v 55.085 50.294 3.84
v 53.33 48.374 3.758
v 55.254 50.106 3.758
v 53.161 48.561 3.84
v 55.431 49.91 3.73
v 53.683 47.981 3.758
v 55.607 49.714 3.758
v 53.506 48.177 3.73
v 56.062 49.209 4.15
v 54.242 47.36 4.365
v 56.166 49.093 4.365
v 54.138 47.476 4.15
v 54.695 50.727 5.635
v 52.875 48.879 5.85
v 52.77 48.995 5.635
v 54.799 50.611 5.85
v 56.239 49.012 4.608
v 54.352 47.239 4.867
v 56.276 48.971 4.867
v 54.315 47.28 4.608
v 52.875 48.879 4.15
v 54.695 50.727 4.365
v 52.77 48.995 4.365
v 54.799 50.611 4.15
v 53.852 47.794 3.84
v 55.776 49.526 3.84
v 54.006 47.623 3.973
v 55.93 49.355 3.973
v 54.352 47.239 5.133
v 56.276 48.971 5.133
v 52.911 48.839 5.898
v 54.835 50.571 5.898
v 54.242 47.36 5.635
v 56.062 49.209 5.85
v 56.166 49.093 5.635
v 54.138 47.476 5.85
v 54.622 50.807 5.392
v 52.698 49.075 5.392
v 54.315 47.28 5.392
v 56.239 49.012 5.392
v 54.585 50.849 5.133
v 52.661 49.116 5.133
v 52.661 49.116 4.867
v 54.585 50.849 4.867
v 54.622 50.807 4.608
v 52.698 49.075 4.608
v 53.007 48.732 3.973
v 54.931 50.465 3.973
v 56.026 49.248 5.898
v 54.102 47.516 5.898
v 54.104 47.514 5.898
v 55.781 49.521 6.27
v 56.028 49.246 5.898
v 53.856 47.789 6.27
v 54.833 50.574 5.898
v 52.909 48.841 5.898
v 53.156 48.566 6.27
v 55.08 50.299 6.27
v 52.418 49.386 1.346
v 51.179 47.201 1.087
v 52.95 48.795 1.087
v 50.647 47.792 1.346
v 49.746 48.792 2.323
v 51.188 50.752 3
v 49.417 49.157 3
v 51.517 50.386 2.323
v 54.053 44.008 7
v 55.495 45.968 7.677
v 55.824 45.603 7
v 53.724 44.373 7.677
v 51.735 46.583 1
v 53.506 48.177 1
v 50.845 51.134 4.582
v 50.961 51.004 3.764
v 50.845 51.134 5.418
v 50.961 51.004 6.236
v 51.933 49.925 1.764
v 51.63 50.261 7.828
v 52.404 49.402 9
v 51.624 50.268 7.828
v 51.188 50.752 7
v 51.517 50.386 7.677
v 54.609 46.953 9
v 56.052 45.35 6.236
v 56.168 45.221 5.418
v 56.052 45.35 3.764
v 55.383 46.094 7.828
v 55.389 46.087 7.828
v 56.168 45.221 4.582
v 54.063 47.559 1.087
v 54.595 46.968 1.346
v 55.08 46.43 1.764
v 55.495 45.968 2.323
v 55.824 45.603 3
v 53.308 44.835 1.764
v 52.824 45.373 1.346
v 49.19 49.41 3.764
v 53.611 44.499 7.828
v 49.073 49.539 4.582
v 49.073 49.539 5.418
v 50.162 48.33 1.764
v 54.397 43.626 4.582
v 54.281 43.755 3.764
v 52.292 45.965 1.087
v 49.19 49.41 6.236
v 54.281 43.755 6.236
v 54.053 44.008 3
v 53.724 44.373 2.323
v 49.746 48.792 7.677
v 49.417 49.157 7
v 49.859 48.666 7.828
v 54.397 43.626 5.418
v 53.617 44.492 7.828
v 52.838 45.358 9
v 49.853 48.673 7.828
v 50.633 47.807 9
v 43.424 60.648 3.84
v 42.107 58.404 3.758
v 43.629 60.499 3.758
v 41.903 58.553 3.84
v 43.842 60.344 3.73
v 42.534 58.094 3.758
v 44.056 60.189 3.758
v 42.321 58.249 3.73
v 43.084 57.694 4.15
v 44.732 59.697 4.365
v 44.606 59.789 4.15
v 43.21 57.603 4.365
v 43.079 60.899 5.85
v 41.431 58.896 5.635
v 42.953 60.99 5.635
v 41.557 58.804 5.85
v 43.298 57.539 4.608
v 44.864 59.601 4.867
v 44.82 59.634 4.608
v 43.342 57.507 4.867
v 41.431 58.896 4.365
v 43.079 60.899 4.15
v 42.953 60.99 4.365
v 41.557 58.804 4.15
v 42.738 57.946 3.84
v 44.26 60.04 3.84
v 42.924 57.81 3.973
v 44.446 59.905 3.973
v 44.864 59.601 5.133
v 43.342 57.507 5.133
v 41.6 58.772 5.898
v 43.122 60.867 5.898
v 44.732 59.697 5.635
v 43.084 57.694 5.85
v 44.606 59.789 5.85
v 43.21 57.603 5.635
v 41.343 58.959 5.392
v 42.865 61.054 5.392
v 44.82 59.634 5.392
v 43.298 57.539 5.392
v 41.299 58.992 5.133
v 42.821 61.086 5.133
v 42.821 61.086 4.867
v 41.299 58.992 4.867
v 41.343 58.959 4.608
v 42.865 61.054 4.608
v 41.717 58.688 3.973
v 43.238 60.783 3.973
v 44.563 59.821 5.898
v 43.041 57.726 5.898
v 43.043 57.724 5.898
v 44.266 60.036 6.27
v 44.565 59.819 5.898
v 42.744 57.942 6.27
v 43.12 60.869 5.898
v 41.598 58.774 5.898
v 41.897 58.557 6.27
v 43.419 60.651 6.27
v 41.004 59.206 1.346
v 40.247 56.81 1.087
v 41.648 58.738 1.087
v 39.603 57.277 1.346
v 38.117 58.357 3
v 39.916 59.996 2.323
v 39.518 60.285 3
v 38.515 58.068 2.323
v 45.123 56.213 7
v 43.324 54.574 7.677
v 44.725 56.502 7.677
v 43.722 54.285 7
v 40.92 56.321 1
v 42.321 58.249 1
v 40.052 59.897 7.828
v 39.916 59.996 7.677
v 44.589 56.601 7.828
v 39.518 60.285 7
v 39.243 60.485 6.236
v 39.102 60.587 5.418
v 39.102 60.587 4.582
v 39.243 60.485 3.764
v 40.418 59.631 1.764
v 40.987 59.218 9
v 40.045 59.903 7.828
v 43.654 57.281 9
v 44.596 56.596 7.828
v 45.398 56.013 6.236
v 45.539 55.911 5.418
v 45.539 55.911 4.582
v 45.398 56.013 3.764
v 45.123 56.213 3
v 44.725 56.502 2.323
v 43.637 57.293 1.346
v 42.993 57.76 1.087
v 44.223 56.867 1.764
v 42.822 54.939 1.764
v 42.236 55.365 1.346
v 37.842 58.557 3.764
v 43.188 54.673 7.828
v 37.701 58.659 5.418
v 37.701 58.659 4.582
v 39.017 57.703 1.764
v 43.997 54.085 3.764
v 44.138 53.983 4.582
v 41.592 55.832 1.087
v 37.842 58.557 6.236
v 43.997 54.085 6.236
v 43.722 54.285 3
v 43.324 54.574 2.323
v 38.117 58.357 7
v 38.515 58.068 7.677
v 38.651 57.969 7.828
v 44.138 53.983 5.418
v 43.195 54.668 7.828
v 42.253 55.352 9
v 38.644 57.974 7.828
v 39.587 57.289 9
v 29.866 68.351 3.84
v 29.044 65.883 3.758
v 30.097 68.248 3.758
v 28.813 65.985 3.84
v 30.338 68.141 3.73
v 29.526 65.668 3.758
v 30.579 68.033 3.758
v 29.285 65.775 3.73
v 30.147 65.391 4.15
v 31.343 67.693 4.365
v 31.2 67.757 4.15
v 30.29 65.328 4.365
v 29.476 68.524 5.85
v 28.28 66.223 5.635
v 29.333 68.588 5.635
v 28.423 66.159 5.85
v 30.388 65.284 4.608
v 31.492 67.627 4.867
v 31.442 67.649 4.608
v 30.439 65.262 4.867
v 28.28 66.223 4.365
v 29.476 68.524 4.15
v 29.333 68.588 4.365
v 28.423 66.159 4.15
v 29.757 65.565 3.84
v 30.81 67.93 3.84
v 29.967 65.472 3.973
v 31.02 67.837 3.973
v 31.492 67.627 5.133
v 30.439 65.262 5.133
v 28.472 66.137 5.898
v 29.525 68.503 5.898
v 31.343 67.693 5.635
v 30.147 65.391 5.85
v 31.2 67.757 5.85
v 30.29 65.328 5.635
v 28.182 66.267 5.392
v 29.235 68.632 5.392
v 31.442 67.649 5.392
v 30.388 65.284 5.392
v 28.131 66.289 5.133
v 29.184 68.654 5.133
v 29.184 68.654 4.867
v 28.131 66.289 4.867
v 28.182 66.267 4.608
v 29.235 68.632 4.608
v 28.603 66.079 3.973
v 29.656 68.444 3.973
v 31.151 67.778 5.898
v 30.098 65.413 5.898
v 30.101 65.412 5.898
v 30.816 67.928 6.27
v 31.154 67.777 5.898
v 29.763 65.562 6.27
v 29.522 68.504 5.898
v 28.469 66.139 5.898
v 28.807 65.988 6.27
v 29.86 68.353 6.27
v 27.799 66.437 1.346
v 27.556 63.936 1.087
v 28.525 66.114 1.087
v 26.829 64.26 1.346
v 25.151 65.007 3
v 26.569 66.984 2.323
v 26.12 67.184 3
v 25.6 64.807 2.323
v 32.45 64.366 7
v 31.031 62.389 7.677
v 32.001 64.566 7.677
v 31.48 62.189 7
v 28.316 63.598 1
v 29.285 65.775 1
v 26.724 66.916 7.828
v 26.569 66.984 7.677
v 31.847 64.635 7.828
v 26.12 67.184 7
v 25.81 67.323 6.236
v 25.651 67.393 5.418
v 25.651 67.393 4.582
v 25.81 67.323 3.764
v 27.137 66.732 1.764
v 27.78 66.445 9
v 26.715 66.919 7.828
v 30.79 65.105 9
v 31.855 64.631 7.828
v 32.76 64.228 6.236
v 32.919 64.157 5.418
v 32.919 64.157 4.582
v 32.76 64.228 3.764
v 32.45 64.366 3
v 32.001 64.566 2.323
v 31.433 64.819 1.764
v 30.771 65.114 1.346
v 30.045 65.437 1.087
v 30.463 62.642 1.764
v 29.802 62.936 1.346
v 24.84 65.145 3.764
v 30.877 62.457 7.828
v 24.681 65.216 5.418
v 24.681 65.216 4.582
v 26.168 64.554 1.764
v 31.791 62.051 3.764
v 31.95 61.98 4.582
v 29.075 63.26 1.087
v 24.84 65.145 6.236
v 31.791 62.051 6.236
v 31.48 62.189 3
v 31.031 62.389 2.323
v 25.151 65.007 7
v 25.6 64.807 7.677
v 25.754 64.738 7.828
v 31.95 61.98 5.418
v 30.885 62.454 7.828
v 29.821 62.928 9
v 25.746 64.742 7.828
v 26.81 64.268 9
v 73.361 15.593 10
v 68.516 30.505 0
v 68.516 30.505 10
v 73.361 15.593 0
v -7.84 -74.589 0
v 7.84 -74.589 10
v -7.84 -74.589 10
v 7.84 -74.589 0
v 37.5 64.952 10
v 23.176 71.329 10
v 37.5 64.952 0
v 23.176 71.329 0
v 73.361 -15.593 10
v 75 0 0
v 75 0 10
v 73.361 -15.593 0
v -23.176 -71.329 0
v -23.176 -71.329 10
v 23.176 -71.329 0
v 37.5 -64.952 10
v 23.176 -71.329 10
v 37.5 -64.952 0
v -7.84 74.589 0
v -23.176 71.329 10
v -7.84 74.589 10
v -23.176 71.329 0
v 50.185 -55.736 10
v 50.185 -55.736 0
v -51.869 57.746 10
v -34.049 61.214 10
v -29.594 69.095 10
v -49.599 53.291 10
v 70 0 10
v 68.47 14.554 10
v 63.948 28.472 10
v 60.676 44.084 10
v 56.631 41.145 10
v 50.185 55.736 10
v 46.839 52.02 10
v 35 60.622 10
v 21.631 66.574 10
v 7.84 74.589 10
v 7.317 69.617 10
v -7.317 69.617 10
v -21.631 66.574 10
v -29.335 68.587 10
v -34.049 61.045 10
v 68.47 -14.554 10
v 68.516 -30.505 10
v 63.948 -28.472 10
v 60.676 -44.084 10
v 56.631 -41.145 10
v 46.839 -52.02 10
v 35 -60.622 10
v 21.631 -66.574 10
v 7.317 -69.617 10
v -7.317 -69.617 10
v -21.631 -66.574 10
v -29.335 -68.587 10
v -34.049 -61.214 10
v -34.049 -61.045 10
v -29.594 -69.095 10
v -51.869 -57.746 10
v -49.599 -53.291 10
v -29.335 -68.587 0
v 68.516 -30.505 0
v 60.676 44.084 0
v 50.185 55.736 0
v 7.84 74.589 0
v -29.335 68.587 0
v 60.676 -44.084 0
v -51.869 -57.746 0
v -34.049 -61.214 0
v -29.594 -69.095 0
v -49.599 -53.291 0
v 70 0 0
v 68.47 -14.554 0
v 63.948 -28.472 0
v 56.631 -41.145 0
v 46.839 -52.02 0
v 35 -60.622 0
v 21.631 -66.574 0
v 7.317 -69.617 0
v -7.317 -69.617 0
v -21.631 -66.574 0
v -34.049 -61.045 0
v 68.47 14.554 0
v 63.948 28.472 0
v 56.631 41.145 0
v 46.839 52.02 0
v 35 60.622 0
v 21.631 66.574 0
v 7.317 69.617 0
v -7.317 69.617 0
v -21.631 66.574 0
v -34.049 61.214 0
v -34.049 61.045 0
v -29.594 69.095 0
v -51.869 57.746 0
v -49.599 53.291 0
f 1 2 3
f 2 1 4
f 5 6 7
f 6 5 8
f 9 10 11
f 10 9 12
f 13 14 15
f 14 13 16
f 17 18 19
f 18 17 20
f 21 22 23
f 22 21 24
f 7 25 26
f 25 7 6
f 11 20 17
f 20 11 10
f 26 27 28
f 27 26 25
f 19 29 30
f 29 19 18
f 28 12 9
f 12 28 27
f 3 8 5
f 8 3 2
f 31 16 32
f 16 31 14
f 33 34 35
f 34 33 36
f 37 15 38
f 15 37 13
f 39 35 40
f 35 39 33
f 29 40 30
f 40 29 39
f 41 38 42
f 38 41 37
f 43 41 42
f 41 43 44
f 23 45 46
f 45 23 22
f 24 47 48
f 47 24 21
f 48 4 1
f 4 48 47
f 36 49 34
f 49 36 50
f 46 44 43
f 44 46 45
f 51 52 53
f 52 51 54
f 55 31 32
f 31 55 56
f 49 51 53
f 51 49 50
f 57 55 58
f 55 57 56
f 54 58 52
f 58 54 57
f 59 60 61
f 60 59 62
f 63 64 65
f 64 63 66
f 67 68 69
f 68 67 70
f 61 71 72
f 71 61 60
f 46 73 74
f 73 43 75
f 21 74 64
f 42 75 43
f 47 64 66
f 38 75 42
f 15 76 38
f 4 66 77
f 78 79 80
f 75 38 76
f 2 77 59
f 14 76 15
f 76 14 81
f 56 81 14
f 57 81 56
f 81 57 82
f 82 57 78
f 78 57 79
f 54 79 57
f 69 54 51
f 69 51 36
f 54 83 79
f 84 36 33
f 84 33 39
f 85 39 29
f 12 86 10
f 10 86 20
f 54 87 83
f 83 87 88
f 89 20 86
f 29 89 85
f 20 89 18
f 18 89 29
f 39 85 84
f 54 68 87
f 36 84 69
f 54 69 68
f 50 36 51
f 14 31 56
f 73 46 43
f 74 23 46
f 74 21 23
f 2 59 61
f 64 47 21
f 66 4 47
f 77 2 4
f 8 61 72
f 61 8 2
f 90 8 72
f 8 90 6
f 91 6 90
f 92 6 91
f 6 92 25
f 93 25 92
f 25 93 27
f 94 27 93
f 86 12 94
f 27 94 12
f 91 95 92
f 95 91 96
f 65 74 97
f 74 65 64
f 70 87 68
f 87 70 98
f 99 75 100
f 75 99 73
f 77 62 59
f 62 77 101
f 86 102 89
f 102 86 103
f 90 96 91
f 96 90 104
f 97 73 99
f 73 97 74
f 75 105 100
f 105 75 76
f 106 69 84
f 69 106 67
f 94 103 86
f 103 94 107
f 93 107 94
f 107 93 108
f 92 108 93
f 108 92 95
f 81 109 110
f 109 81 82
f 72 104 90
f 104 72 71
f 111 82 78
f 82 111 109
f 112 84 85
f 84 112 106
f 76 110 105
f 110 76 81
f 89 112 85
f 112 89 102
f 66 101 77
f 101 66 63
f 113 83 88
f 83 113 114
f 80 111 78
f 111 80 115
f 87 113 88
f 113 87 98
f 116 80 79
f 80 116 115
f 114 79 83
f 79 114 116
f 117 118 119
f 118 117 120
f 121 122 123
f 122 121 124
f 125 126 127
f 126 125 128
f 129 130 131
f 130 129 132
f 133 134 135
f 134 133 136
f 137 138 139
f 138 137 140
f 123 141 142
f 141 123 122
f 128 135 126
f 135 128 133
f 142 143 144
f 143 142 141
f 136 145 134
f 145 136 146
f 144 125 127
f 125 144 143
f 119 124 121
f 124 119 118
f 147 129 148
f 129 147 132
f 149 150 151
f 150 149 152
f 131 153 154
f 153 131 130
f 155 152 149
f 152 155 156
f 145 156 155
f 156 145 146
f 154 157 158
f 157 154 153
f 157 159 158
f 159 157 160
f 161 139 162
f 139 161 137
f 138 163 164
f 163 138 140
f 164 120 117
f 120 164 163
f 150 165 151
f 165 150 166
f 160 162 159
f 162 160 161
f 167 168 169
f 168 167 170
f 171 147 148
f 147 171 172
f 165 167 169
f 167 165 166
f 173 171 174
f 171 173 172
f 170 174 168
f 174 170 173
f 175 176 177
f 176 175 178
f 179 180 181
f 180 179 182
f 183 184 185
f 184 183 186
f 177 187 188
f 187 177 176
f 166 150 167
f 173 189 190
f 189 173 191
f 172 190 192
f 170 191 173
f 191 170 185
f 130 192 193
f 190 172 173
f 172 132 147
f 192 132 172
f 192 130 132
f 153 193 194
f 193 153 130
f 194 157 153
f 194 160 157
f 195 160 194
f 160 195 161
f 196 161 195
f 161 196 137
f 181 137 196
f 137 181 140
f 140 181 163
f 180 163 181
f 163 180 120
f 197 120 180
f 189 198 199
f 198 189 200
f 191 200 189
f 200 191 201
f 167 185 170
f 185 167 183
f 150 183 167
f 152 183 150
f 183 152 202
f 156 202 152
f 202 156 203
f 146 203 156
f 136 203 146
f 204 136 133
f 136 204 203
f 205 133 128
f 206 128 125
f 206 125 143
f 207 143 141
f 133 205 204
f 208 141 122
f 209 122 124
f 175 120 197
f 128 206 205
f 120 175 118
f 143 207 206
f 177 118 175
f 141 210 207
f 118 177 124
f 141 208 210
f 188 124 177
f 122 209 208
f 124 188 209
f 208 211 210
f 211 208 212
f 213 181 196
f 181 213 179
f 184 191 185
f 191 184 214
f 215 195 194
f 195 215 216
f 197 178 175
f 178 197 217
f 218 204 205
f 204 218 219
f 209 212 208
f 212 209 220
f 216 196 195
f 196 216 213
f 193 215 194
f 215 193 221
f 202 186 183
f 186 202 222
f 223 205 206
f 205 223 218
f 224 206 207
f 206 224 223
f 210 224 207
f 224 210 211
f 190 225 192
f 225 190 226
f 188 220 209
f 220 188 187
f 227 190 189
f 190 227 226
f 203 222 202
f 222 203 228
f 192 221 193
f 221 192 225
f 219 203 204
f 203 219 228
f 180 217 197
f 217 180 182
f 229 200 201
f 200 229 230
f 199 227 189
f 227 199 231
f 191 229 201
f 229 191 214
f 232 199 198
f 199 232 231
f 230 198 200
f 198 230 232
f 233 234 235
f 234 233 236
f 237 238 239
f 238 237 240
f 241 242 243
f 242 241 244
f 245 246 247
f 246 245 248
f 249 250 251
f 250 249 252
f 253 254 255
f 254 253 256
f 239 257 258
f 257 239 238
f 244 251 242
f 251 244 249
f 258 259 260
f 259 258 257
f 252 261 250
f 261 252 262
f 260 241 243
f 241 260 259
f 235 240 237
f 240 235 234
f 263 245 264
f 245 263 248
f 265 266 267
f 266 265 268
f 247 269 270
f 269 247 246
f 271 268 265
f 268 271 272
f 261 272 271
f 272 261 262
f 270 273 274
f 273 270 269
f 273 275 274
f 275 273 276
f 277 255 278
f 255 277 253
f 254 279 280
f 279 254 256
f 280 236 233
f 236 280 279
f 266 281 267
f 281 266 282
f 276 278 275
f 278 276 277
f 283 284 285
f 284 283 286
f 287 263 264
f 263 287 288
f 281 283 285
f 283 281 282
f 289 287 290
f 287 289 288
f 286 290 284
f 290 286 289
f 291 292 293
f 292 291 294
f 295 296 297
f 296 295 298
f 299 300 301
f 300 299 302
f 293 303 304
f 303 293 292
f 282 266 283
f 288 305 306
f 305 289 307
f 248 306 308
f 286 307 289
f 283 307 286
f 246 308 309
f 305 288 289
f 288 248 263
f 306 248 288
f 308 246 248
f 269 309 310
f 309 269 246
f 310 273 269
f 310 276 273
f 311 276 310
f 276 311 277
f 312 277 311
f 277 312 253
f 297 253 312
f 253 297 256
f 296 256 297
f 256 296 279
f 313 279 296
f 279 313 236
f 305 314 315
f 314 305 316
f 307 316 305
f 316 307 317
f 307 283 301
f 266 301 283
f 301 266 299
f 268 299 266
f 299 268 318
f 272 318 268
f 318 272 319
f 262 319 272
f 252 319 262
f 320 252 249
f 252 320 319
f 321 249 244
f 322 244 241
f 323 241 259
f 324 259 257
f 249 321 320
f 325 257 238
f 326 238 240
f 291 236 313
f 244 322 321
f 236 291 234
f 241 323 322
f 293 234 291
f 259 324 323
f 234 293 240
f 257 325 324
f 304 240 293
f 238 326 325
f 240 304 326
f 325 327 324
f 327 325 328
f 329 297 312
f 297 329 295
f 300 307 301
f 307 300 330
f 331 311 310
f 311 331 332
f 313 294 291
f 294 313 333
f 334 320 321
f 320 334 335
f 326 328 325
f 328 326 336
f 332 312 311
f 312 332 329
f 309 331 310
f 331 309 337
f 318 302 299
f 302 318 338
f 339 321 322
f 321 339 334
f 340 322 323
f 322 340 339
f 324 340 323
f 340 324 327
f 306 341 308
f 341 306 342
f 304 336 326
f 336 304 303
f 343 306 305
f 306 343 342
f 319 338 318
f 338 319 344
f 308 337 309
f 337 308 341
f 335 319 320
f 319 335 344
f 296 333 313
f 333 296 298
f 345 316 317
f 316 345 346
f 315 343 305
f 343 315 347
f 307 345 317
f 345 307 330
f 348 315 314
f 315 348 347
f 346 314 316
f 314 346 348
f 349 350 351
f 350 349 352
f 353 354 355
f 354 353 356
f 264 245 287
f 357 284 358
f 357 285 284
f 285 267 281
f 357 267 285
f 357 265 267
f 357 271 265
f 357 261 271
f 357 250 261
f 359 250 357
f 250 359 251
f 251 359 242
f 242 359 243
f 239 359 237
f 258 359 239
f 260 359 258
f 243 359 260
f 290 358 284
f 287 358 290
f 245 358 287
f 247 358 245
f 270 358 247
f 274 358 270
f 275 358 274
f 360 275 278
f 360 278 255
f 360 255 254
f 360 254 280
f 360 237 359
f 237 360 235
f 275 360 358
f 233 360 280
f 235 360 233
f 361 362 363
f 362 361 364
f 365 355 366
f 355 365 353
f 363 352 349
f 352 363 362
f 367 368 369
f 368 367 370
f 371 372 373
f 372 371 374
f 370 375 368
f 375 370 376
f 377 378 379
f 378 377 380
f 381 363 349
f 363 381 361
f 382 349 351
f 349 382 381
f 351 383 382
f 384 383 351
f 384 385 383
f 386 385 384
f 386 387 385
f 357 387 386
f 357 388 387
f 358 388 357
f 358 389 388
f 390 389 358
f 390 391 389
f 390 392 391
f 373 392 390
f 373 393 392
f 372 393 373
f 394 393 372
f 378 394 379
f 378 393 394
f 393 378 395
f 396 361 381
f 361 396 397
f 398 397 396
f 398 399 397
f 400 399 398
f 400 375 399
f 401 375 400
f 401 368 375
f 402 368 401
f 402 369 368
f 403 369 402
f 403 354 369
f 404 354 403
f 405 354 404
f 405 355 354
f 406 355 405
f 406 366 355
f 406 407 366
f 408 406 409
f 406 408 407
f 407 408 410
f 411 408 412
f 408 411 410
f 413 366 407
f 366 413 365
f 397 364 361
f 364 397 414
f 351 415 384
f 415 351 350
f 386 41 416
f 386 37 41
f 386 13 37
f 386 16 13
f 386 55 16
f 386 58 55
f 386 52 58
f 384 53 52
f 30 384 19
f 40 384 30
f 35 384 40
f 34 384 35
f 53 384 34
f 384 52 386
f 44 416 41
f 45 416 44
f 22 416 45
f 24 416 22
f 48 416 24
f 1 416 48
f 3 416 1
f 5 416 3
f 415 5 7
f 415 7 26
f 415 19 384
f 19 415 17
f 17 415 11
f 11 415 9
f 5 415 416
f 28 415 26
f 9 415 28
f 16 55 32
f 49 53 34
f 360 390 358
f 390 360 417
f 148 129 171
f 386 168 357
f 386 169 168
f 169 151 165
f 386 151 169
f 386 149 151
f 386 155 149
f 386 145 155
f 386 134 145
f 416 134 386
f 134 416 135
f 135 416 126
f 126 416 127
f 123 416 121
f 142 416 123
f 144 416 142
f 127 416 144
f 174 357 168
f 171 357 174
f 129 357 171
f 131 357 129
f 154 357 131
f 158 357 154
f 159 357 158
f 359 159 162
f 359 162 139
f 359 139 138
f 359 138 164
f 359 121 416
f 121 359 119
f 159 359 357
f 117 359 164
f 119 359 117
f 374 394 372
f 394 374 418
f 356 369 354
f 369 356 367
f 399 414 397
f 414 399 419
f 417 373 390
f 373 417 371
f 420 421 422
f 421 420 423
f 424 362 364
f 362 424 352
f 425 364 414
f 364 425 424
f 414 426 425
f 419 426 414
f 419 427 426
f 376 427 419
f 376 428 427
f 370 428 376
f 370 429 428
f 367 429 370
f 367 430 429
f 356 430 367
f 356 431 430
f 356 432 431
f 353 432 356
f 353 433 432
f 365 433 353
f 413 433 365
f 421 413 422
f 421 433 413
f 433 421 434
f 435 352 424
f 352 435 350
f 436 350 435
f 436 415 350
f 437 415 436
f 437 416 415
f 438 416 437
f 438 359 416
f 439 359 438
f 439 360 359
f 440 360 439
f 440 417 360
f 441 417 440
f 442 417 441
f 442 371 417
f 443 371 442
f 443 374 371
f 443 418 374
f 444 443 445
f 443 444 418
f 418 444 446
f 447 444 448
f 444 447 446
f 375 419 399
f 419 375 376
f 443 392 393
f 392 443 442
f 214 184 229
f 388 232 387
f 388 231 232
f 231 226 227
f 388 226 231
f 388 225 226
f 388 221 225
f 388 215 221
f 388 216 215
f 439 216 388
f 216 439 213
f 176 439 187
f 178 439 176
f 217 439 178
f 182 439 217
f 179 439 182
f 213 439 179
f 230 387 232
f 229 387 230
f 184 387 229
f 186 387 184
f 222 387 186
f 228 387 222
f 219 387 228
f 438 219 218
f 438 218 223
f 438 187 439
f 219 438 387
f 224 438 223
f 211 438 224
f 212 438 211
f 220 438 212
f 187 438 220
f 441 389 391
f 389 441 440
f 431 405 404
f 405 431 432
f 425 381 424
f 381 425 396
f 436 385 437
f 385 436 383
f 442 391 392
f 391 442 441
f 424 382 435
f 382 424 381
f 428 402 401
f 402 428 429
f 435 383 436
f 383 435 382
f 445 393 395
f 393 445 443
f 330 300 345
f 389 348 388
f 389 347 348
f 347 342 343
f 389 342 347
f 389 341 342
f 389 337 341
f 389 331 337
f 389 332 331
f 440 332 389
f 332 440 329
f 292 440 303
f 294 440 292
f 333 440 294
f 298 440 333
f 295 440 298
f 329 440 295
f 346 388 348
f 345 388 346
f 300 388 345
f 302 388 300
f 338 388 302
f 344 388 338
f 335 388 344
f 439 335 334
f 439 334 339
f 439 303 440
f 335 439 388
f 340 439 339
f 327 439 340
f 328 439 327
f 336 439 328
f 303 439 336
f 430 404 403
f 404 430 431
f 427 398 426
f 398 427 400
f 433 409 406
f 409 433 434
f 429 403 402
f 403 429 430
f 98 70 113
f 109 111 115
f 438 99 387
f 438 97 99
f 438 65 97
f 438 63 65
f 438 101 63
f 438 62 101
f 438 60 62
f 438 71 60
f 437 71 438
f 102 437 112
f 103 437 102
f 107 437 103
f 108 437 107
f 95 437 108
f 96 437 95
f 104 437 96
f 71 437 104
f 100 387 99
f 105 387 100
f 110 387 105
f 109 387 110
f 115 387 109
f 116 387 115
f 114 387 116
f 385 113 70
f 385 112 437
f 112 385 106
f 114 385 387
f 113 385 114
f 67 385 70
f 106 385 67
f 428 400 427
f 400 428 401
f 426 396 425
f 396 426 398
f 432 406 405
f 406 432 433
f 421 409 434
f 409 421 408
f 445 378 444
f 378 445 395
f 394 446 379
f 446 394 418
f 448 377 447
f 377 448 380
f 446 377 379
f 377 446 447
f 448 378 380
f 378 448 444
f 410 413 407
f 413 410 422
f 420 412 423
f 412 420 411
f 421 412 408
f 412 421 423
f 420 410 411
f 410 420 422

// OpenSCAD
include <MCAD/units.scad>;
include <MCAD/teardrop.scad>;

// Make epsilon bigger than normal so this model looks decent while zoomed out
epsilon = 0.1 * mm;

module headband(d, w, h, a, hd, hs, he, ht, wd, ww) {
	union() {
		difference() {
			cylinder(r = d/2 + w, h = h, $fn = 30);

			translate([0, 0, -epsilon])
			cylinder(r = d/2, h = h + 2*epsilon, $fn = 30);

			translate([-d/2 - w, -d/2 - w, -epsilon])
			cube([d/2 + w - (d/2 + w) * sin(a), d + 2*w, h + 2*epsilon]);

			render(convexity = 5)
			for(theta = [hs:ht:he]) {
				translate([d/2 * cos(theta), d/2 * sin(theta), h/2])
				rotate([0, 0, theta]) {
					intersection() {
						teardrop(radius = hd/2, length = d, angle = 90);

						cube([d, hd, hd], center=true);
					}

					intersection() {
						teardrop(radius = wd/2, length = ww * 2, angle = 90);

						cube([ww * 2, wd, wd], center=true);
					}
				}
			}

			render(convexity = 5)
			for(theta = [-hs:ht:-he]) {
				translate([d/2 * cos(theta), d/2 * sin(theta), h/2])
				rotate([0, 0, theta]) {
					intersection() {
						teardrop(radius = hd/2, length = d, angle = 90);

						cube([d, hd, hd], center=true);
					}

					intersection() {
						teardrop(radius = wd/2, length = ww * 2, angle = 90);

						cube([ww * 2, wd, wd], center=true);
					}
				}
			}
		}

		translate([-(d/2) * sin(a), (d/2) * cos(a), 0])
		rotate([0, 0, a])
		translate([-4*w, 0, 0])
		cube([5*w, w, h]);

		translate([-(d/2) * sin(a), -(d/2) * cos(a), 0])
		rotate([0, 0, -a])
		translate([-4*w, -w, 0])
		cube([5*w, w, h]);
	}
}

headband(d = 140, w = 5, h = 10, a = 27, hd = 0.100 * inch, hs = 42, he = 66, ht = 12, wd = 8, ww = 2);
